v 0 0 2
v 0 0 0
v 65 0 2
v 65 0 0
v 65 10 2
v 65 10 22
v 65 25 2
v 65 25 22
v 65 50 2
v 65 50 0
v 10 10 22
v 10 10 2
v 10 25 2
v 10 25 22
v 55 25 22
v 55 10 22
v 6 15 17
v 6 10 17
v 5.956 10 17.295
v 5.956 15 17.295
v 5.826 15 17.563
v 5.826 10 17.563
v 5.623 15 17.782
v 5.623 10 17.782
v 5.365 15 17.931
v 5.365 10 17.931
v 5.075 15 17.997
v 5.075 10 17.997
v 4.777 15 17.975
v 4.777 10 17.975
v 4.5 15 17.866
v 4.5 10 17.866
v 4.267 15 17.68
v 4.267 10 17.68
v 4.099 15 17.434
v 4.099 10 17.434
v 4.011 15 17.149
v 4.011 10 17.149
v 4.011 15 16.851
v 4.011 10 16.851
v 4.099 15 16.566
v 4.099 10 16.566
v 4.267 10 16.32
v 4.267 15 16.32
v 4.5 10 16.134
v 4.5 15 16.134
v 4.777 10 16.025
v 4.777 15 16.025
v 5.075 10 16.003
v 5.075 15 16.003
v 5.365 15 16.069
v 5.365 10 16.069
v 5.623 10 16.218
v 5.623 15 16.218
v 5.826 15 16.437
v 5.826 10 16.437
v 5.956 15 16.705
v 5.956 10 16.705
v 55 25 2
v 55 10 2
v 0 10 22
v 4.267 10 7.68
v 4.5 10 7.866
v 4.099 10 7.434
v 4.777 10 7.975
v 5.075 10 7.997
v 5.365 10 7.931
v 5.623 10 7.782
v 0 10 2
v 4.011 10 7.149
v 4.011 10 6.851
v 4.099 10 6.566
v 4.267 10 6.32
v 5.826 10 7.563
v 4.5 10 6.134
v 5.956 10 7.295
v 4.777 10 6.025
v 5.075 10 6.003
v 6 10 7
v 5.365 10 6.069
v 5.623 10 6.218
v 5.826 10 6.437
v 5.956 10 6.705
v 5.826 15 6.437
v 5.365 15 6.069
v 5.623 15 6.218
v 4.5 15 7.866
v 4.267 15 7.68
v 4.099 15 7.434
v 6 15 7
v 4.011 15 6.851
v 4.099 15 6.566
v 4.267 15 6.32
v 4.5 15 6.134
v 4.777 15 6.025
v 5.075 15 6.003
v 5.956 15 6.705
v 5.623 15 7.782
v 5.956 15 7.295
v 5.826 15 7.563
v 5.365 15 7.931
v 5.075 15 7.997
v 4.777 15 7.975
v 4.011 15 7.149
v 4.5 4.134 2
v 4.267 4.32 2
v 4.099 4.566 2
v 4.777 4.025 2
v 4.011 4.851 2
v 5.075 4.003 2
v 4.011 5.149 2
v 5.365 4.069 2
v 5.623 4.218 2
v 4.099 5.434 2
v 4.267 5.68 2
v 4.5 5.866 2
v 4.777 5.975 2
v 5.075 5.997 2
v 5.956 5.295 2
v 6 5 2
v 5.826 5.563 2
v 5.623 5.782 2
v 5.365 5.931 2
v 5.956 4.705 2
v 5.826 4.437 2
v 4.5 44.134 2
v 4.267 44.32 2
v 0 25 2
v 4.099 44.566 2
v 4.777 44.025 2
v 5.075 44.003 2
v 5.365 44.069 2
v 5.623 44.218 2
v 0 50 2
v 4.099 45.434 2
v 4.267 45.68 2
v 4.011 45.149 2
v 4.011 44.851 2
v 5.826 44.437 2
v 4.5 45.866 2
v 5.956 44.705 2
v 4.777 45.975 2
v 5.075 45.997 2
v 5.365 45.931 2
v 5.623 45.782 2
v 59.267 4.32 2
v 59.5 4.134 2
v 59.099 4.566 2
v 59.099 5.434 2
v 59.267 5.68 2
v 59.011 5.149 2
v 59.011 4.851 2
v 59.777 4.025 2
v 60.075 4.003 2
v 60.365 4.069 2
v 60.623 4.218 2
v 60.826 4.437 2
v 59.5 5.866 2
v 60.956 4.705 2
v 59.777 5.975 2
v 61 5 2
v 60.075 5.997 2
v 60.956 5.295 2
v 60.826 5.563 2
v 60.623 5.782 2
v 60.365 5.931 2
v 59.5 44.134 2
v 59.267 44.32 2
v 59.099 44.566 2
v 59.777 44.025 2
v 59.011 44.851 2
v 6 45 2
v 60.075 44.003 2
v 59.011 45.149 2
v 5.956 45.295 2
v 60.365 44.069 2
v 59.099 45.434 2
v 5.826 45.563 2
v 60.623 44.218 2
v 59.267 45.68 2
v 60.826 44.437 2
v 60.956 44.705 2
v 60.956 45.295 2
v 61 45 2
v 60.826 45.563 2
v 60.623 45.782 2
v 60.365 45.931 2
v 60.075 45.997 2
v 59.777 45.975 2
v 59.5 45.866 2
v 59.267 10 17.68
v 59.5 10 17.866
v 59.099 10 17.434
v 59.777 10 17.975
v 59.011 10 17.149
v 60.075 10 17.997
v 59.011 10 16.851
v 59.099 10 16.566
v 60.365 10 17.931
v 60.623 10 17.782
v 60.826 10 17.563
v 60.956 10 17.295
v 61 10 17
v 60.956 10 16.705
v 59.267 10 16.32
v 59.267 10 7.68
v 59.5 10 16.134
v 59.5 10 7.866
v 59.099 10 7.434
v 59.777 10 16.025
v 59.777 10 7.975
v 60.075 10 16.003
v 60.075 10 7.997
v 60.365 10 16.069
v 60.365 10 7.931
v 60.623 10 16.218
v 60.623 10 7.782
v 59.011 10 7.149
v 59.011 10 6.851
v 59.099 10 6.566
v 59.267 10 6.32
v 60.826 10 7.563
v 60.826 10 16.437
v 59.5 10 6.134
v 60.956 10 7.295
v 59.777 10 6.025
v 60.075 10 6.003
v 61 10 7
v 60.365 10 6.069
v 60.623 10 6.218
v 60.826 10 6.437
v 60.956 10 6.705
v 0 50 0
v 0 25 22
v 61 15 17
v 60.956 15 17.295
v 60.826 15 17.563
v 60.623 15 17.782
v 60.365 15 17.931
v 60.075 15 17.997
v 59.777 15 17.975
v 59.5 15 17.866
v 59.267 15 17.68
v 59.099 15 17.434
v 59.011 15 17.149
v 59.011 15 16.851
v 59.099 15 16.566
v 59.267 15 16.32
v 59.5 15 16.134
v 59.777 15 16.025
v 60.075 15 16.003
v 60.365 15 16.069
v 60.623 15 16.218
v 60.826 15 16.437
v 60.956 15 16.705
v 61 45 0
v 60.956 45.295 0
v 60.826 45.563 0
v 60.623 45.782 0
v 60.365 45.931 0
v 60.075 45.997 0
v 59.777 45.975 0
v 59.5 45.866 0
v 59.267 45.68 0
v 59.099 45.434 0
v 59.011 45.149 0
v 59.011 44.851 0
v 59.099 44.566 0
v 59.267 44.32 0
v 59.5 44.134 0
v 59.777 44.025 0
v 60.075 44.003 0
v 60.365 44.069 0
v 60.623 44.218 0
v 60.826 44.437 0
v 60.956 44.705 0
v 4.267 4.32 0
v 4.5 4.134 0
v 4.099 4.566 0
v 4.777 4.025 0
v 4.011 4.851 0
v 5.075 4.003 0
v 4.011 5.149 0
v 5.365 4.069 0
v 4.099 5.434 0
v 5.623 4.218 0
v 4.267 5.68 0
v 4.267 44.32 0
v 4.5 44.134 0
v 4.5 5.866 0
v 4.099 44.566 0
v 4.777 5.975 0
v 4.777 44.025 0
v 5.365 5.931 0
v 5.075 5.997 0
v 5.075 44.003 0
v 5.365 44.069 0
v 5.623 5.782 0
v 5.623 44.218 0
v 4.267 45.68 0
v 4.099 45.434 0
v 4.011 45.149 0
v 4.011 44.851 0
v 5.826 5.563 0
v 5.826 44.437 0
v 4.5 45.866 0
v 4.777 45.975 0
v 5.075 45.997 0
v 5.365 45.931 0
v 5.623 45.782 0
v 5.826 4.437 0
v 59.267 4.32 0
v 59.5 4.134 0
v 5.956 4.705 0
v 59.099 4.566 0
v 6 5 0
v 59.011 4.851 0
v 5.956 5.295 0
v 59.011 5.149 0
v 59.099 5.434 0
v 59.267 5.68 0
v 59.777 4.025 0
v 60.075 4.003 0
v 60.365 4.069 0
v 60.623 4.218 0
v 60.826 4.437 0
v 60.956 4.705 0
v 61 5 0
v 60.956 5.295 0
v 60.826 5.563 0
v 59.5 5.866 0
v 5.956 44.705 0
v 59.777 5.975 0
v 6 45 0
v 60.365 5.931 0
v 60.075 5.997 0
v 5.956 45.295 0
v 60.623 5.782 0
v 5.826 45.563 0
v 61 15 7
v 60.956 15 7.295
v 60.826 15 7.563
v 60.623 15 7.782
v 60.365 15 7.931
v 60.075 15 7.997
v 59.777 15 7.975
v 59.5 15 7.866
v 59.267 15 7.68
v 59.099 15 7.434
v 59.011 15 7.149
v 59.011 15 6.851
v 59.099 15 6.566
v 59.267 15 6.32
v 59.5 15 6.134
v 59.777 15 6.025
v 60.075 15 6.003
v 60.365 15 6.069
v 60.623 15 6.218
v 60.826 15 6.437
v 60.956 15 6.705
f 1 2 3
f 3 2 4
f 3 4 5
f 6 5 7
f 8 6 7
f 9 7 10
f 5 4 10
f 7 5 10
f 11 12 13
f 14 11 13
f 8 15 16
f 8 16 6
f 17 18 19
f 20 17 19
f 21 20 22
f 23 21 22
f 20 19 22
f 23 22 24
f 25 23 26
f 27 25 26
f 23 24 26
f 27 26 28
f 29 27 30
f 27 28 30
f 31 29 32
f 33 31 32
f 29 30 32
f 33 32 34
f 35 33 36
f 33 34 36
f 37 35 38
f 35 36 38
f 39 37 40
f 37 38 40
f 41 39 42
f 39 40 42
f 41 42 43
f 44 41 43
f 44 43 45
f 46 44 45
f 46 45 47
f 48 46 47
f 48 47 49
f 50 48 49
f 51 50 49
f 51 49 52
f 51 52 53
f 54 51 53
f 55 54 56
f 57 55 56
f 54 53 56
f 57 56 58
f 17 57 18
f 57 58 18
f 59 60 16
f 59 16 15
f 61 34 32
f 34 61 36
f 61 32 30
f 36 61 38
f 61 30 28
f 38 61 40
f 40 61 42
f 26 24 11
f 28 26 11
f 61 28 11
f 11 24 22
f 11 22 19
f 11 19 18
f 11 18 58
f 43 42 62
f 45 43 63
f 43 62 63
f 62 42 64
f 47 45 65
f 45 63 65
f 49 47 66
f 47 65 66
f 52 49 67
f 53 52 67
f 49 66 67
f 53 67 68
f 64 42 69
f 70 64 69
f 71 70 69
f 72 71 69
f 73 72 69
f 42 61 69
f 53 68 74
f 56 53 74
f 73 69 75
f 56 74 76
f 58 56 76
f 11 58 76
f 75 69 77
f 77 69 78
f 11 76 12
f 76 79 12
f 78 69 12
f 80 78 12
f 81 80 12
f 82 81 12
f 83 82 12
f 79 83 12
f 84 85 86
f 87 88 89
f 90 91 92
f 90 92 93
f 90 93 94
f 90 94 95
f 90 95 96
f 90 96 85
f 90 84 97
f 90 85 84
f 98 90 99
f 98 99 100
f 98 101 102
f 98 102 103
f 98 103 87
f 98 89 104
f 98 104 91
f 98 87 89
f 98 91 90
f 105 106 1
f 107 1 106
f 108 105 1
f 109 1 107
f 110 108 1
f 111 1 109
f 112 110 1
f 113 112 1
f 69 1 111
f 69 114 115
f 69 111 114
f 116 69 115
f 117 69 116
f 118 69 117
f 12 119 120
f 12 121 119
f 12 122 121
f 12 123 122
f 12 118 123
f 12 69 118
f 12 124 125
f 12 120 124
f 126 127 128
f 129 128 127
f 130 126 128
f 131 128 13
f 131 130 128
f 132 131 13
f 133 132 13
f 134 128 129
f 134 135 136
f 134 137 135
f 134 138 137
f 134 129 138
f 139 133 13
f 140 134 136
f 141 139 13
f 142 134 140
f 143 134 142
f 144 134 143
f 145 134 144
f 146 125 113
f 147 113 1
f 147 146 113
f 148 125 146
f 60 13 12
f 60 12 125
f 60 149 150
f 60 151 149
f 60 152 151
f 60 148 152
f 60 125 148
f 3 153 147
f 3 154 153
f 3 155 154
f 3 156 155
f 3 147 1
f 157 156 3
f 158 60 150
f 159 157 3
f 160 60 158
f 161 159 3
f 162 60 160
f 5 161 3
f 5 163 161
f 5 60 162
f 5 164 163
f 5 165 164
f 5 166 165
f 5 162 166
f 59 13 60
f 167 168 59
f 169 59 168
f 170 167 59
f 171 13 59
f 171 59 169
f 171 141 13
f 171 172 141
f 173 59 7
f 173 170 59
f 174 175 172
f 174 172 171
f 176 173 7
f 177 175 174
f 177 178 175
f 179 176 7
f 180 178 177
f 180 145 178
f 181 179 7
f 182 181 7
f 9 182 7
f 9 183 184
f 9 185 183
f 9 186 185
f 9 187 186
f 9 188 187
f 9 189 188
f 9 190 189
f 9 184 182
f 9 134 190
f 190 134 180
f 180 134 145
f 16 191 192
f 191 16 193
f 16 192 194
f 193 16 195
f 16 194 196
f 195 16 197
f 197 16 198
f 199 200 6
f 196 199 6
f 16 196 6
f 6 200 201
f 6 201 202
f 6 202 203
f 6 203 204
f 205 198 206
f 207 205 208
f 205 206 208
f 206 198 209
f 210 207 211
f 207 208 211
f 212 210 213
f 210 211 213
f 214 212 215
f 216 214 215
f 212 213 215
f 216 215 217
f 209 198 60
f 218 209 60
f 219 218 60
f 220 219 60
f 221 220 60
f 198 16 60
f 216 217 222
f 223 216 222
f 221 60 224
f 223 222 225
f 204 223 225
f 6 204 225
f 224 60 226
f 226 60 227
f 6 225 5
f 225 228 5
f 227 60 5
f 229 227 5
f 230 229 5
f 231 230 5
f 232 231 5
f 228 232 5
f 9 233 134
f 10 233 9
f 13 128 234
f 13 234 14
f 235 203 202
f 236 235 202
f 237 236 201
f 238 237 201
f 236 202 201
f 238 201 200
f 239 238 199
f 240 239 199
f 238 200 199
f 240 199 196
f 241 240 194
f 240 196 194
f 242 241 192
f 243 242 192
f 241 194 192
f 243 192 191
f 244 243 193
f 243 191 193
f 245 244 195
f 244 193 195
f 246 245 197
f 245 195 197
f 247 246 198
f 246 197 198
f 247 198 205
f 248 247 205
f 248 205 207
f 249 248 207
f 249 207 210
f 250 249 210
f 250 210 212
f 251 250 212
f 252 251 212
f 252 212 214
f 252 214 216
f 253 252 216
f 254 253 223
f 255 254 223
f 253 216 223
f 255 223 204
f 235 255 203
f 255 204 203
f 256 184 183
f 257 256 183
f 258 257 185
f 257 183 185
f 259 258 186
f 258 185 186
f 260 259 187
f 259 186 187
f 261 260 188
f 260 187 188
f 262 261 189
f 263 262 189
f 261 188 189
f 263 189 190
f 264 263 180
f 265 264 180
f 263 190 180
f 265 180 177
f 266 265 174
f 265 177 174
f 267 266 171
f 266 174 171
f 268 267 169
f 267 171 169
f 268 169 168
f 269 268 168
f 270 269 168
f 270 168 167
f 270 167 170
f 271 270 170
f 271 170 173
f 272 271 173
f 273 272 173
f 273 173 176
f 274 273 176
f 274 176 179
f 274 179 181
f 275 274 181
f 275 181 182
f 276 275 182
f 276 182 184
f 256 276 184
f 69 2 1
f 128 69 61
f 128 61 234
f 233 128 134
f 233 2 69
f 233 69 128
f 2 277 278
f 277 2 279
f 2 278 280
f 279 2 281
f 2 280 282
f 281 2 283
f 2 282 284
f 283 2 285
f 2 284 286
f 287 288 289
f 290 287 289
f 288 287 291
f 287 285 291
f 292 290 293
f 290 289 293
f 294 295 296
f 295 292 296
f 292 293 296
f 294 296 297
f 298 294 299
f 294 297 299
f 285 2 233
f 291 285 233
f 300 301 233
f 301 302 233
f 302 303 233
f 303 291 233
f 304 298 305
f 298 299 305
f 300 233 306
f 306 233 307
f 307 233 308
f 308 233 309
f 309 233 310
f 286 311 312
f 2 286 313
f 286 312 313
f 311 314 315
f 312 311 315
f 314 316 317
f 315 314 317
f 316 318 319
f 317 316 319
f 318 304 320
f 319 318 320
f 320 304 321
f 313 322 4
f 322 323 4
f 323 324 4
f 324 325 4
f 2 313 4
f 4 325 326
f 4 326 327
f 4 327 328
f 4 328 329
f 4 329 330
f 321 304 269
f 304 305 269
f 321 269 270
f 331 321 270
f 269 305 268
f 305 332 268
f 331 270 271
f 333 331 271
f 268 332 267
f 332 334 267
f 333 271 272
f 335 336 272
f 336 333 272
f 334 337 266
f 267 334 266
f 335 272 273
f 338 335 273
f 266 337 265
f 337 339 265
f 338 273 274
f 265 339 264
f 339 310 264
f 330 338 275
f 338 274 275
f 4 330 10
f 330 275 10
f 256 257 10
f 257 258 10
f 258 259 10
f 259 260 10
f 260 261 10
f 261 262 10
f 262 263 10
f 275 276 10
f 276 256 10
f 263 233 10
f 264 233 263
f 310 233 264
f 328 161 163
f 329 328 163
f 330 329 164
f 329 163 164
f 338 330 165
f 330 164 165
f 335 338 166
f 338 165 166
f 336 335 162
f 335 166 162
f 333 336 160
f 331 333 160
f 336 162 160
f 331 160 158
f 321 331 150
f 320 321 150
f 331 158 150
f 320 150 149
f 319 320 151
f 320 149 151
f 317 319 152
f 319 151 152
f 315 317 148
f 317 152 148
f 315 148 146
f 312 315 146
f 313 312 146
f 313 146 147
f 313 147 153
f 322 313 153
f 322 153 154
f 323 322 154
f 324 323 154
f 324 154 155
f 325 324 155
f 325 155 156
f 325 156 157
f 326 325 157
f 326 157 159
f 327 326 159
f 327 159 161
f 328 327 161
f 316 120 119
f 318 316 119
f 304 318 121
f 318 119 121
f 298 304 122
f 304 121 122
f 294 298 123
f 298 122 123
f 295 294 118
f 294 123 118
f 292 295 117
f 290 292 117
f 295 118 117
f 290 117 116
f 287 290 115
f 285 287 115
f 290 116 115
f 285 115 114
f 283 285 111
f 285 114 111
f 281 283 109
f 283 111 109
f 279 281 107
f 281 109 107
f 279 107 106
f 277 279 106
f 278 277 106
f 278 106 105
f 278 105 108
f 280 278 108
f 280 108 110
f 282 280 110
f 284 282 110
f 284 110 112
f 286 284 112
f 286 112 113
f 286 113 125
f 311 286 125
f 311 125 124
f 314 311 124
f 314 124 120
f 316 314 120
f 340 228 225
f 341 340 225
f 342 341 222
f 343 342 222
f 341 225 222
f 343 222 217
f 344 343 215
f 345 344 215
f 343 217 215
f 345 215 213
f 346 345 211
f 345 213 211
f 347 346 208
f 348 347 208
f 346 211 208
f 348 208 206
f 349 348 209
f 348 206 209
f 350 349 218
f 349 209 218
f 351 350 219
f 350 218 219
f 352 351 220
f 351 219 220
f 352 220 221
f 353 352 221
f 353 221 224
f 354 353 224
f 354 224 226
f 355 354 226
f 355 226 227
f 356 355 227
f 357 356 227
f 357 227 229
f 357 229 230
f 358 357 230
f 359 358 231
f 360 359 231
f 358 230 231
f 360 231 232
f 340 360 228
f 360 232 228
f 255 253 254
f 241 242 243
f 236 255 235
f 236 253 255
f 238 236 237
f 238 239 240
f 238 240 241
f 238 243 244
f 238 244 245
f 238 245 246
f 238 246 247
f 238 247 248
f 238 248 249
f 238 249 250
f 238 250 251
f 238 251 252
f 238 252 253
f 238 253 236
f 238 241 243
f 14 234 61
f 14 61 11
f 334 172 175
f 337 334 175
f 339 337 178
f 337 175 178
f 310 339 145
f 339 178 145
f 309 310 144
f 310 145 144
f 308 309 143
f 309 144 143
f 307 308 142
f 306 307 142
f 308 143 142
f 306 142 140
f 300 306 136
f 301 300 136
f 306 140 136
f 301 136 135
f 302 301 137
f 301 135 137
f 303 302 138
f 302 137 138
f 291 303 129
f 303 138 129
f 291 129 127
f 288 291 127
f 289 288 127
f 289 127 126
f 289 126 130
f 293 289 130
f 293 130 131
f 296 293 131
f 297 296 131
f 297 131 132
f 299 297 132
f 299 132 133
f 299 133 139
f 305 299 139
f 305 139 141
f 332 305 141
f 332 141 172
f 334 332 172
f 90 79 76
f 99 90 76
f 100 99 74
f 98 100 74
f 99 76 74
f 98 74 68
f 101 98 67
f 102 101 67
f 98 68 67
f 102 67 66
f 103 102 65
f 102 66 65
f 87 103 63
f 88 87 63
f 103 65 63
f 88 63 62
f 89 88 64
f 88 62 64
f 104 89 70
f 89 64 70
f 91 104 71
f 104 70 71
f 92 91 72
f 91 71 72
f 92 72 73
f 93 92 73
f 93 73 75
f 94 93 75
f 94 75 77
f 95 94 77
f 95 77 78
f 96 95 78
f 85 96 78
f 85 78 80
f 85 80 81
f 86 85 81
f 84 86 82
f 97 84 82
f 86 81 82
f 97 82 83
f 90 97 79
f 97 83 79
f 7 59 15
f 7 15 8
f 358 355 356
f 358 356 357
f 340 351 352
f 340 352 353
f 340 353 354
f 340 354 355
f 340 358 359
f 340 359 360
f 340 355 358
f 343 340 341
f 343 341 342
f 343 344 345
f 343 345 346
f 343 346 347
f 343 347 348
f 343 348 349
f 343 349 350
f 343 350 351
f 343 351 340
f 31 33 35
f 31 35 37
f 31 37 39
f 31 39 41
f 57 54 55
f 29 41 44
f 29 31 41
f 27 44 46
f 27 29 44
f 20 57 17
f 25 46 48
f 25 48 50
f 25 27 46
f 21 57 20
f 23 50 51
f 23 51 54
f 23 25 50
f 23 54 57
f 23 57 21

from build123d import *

# Parameters (mm, degrees)
F0_W     = 65
F0_H     = 50
F1_DEPTH = 2
F2_W     = 10
F2_H     = 15
F3_DEPTH = 20
F4_R     = 1
F5_DEPTH = 5
F6_R     = 1
F7_DEPTH = 25


with BuildPart() as f1:
    # F0 (on Top) → F1 (new body)
    with BuildSketch(Plane.XY):
        with Locations((32.5, 25)):
            Rectangle(F0_W, F0_H)
    extrude(amount=F1_DEPTH)

    # F2 (on face) → F3 (join)
    with BuildSketch(Plane.XY.offset(2)):
        with Locations((5, 17.5)):
            Rectangle(F2_W, F2_H)
        with Locations((60, 17.5)):
            Rectangle(F2_W, F2_H)
    extrude(amount=F3_DEPTH)

    # F4 (on face) → F5 (cut)
    with BuildSketch(Plane.XZ.offset(-10)):
        with Locations((5, 17)):
            Circle(F4_R)
        with Locations((5, 7)):
            Circle(F4_R)
        with Locations((60, 17)):
            Circle(F4_R)
        with Locations((60, 7)):
            Circle(F4_R)
    extrude(amount=-F5_DEPTH, mode=Mode.SUBTRACT)

    # F6 (on face) → F7 (cut)
    with BuildSketch(Plane.XY.offset(2)):
        with Locations((5, 45)):
            Circle(F6_R)
        with Locations((60, 45)):
            Circle(F6_R)
        with Locations((60, 5)):
            Circle(F6_R)
        with Locations((5, 5)):
            Circle(F6_R)
    extrude(amount=-F7_DEPTH, mode=Mode.SUBTRACT)


solid = f1.part
